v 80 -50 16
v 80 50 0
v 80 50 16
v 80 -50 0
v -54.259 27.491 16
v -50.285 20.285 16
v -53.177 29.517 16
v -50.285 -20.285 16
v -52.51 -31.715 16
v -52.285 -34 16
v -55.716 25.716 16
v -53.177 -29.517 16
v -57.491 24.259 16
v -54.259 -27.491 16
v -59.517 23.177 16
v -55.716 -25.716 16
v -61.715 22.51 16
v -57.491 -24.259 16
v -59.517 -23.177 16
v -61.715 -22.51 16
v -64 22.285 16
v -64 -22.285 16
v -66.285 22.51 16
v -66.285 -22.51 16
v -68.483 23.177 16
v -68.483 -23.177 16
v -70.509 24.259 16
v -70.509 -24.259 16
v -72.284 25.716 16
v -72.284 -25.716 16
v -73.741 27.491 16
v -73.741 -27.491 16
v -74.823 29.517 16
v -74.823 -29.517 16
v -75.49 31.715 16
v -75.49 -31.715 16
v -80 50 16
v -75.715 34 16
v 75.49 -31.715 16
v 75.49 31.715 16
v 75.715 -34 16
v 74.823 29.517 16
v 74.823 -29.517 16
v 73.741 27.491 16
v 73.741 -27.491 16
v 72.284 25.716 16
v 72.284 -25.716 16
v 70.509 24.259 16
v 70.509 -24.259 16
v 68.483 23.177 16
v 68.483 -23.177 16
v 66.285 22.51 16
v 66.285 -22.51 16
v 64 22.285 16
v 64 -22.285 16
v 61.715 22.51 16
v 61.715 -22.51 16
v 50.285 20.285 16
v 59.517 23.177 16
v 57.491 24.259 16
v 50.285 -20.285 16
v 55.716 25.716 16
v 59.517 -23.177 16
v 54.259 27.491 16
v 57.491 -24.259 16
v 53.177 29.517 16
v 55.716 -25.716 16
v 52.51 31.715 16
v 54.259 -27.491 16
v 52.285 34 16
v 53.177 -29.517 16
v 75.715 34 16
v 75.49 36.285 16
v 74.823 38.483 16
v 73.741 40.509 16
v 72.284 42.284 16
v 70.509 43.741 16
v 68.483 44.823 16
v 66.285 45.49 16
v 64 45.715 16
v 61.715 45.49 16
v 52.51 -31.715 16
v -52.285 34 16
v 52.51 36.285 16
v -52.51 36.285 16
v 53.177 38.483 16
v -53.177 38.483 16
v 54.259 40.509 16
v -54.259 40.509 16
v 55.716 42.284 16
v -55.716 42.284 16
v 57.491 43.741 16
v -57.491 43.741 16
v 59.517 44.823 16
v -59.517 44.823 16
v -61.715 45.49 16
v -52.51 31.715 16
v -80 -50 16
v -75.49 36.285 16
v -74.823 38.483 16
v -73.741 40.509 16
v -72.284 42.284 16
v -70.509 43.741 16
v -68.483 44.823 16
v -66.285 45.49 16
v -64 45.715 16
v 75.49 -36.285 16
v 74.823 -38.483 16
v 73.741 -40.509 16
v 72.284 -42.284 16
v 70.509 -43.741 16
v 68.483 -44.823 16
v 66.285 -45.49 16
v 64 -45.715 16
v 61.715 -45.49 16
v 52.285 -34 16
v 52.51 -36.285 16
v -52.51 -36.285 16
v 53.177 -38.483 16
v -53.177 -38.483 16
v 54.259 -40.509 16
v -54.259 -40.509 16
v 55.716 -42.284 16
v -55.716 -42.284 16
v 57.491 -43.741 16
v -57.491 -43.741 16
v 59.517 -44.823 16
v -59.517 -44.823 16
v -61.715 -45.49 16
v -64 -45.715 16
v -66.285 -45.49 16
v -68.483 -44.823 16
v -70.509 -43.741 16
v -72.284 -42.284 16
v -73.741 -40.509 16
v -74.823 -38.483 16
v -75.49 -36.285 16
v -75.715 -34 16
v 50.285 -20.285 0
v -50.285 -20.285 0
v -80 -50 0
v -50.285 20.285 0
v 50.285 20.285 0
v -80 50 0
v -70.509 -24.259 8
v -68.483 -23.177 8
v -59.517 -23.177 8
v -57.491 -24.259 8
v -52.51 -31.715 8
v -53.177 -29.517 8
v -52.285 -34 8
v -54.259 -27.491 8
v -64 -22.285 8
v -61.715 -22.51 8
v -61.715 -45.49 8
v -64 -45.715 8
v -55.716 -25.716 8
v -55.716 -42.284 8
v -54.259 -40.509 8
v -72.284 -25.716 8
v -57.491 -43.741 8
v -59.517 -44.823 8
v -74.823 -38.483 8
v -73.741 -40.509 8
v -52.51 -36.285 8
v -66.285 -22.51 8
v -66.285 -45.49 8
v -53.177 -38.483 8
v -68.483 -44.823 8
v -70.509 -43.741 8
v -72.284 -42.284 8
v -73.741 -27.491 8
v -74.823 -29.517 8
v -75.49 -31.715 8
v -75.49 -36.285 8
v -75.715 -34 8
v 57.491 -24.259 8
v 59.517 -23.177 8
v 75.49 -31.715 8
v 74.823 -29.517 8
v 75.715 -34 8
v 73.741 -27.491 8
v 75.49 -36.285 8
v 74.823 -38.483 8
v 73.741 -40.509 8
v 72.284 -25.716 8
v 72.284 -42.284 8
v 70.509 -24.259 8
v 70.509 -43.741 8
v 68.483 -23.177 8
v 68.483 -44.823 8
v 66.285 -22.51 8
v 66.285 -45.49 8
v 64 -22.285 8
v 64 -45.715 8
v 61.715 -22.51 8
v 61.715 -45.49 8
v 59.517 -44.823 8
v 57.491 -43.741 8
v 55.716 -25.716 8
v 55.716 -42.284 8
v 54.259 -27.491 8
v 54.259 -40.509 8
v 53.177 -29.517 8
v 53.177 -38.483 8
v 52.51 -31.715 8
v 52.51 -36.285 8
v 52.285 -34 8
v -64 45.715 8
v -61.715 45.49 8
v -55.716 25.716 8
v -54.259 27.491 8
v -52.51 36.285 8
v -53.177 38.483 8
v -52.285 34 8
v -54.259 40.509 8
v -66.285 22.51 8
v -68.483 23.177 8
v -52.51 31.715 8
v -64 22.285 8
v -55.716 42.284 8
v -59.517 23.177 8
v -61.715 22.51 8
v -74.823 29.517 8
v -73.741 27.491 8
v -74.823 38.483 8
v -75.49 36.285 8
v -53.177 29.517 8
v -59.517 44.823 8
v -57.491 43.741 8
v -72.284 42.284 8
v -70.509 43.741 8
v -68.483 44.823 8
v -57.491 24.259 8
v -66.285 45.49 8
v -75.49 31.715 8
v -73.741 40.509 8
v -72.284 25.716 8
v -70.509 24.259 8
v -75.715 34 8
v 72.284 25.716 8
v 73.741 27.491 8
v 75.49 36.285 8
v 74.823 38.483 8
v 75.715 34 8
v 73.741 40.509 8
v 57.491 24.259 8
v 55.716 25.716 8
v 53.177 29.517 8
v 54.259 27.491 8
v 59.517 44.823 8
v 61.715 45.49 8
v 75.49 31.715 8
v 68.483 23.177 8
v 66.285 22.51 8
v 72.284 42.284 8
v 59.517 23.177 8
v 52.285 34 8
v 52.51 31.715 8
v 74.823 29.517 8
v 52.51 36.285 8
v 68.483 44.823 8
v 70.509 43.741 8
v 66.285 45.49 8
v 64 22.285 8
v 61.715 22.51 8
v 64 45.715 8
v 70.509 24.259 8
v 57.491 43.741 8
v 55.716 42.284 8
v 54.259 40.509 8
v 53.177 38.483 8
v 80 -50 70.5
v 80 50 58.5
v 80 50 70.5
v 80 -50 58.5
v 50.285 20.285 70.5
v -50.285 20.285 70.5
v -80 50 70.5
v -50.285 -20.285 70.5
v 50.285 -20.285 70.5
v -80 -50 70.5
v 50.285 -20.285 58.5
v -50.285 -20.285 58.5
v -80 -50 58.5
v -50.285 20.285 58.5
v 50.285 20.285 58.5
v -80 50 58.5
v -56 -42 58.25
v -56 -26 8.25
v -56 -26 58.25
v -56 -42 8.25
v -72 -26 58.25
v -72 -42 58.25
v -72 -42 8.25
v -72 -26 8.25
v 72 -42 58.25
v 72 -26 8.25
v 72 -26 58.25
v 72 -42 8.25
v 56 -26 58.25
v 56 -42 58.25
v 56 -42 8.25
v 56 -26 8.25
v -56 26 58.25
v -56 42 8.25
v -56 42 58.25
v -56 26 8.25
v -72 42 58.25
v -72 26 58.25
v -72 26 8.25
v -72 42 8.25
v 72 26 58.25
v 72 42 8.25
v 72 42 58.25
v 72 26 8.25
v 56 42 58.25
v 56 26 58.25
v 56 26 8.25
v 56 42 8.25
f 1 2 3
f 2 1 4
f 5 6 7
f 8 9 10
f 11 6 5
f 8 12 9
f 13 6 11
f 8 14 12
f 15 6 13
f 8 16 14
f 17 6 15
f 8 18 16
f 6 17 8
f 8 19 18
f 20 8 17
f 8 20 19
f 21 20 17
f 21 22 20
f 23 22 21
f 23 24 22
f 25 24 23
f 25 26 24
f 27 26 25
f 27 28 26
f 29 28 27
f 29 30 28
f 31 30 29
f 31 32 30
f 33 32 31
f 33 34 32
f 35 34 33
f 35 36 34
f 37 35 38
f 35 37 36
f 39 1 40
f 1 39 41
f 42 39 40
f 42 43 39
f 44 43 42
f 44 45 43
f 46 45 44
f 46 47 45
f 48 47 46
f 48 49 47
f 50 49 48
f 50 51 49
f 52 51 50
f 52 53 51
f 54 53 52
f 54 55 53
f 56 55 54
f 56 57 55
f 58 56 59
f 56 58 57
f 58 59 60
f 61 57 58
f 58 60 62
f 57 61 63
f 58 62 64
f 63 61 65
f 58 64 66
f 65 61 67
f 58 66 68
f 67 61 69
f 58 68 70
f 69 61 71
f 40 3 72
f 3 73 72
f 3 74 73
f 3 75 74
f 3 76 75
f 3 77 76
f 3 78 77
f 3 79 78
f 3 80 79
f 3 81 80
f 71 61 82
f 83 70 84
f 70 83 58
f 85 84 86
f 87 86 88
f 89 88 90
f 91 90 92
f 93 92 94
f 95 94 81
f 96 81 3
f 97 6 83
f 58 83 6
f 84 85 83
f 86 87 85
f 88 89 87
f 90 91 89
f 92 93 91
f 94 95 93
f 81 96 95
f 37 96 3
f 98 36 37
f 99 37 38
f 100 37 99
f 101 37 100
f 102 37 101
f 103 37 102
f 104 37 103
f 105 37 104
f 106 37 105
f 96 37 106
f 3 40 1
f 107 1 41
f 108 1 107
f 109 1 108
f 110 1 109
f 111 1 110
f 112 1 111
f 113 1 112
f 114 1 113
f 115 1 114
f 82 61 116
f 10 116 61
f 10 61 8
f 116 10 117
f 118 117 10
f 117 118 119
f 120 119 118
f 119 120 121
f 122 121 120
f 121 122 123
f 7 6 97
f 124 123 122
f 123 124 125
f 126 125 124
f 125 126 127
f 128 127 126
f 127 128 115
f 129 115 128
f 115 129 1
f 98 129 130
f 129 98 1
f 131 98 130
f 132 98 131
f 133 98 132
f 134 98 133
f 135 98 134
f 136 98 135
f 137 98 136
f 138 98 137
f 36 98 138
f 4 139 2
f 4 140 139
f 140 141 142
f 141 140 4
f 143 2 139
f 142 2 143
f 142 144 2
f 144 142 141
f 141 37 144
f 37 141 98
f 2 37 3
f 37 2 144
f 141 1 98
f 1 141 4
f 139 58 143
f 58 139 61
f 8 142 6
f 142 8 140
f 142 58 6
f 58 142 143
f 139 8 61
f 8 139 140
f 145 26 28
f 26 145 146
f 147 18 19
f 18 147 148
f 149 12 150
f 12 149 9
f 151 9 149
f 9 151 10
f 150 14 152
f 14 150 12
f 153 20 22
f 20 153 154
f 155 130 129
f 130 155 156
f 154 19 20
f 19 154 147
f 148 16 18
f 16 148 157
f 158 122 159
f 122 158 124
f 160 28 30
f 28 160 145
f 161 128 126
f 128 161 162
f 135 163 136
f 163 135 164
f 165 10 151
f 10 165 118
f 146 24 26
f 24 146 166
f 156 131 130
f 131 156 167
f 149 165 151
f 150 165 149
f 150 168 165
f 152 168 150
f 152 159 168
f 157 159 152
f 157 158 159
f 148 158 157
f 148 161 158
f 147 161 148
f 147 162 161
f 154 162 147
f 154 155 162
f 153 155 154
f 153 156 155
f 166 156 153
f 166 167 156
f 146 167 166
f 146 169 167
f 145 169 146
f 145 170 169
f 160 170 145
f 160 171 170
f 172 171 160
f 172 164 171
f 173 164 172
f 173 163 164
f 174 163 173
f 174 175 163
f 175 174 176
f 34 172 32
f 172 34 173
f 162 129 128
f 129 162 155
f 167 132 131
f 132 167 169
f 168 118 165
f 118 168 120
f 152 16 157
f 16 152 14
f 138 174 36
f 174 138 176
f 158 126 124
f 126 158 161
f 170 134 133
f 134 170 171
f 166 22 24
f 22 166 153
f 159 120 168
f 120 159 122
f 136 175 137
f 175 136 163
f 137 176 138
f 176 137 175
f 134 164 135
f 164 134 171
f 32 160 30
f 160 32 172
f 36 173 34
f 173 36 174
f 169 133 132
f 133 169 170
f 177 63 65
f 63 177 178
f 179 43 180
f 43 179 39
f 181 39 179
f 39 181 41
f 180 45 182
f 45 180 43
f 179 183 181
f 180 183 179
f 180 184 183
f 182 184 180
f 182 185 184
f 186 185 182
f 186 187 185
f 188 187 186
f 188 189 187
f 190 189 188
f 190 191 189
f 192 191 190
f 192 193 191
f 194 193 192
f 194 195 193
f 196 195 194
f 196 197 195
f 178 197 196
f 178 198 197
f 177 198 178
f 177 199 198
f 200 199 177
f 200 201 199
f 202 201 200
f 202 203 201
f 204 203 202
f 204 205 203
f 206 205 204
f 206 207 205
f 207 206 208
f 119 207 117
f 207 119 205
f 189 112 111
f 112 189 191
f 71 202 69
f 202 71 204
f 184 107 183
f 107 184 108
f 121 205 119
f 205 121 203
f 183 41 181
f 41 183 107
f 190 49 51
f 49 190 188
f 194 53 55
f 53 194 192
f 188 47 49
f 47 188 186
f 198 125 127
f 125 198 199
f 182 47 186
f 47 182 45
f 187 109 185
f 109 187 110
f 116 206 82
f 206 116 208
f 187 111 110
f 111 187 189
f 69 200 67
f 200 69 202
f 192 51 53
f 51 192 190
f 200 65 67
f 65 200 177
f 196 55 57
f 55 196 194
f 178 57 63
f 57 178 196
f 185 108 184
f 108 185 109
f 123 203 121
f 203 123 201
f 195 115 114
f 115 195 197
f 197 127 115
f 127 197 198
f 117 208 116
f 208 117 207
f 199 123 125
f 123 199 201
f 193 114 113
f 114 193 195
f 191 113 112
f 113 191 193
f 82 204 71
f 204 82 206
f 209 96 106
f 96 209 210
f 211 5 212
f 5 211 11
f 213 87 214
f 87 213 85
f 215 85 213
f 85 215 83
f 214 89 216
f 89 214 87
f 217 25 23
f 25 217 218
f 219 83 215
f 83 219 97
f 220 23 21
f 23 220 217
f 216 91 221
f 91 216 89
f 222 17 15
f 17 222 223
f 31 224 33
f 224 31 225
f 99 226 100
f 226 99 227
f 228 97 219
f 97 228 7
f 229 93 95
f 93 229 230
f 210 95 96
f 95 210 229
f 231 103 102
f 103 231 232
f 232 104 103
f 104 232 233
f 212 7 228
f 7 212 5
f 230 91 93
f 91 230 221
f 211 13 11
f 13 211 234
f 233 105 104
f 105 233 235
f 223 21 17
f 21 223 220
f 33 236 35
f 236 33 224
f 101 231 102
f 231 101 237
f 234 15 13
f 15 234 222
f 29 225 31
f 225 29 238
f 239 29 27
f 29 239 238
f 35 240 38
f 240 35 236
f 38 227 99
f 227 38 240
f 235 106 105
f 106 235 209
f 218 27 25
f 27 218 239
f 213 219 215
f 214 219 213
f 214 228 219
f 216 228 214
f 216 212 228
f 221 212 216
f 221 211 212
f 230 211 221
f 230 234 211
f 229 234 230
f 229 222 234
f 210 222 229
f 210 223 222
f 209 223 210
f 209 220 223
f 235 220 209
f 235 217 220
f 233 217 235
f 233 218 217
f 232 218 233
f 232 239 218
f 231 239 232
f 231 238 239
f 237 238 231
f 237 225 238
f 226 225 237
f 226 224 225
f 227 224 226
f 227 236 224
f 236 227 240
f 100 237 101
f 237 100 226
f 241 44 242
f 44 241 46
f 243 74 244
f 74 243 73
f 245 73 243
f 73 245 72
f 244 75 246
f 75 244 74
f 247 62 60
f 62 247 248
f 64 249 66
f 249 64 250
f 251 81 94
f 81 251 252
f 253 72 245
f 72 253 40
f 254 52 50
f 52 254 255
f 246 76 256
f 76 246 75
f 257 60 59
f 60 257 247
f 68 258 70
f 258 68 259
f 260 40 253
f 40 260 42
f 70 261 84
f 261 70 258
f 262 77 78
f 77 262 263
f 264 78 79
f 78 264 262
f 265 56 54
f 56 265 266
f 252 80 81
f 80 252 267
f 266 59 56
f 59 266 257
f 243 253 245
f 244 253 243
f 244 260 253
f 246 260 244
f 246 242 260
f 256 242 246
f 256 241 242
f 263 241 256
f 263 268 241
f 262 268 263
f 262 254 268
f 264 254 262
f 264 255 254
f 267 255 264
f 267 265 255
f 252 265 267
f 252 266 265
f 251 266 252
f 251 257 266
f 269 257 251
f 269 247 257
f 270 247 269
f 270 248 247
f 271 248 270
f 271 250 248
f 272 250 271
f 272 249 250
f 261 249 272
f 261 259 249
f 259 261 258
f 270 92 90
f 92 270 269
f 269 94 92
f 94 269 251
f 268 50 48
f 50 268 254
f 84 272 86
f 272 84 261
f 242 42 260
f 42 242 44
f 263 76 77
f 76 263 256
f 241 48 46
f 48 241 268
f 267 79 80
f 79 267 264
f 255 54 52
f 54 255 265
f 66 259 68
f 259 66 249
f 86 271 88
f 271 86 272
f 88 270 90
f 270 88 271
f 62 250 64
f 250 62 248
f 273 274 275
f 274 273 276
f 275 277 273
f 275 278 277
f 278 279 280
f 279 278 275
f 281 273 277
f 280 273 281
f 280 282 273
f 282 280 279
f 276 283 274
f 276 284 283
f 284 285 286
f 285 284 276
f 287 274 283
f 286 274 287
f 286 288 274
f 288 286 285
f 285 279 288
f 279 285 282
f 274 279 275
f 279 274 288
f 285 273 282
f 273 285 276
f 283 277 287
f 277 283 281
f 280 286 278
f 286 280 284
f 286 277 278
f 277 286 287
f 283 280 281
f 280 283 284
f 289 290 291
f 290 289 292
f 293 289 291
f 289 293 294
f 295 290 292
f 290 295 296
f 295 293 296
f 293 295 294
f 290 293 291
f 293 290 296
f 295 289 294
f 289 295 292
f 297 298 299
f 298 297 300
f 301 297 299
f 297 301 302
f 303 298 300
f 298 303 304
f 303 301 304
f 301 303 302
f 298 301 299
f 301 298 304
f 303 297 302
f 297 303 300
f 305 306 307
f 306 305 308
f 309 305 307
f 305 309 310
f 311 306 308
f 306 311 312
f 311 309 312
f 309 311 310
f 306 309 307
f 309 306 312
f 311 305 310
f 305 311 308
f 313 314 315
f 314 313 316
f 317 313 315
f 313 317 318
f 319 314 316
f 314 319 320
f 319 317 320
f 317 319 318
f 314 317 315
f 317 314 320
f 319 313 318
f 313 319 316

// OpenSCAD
$fn = 32;

// ------------------------------------------------------------------------
// Frame cube: base 160 x 100 mm, posts 50 mm tall
// Every part is its own module, assembly() places every instance.
// ------------------------------------------------------------------------

// --- part 1 ---
module base_frame() {
  difference() {
    translate([-80, -50, 0]) cube([160, 100, 16]);
    translate([-50.285, -20.285, -1]) cube([100.57, 40.57, 18]);
    translate([-64, -34, 8]) cylinder(h = 9, d = 23.43);
    translate([64, -34, 8]) cylinder(h = 9, d = 23.43);
    translate([-64, 34, 8]) cylinder(h = 9, d = 23.43);
    translate([64, 34, 8]) cylinder(h = 9, d = 23.43);
  }
}

// --- part 2 ---
module corner_post() {
  translate([-8, -8, 0]) cube([16, 16, 50]);
}

// --- part 3 ---
module top_frame() {
  difference() {
    translate([-80, -50, 0]) cube([160, 100, 12]);
    translate([-50.285, -20.285, -1]) cube([100.57, 40.57, 14]);
  }
}

// --- assembly ---
module assembly() {
  color([0.80, 0.24, 0.20]) translate([0, 0, 0]) rotate([0, 0, 0]) base_frame();
  color([0.20, 0.45, 0.75]) translate([-64, -34, 8.25]) rotate([0, 0, 0]) corner_post();
  color([0.25, 0.62, 0.32]) translate([64, -34, 8.25]) rotate([0, 0, 0]) corner_post();
  color([0.92, 0.70, 0.18]) translate([-64, 34, 8.25]) rotate([0, 0, 0]) corner_post();
  color([0.58, 0.35, 0.70]) translate([64, 34, 8.25]) rotate([0, 0, 0]) corner_post();
  color([0.16, 0.66, 0.66]) translate([0, 0, 58.5]) rotate([0, 0, 0]) top_frame();
}

assembly();
